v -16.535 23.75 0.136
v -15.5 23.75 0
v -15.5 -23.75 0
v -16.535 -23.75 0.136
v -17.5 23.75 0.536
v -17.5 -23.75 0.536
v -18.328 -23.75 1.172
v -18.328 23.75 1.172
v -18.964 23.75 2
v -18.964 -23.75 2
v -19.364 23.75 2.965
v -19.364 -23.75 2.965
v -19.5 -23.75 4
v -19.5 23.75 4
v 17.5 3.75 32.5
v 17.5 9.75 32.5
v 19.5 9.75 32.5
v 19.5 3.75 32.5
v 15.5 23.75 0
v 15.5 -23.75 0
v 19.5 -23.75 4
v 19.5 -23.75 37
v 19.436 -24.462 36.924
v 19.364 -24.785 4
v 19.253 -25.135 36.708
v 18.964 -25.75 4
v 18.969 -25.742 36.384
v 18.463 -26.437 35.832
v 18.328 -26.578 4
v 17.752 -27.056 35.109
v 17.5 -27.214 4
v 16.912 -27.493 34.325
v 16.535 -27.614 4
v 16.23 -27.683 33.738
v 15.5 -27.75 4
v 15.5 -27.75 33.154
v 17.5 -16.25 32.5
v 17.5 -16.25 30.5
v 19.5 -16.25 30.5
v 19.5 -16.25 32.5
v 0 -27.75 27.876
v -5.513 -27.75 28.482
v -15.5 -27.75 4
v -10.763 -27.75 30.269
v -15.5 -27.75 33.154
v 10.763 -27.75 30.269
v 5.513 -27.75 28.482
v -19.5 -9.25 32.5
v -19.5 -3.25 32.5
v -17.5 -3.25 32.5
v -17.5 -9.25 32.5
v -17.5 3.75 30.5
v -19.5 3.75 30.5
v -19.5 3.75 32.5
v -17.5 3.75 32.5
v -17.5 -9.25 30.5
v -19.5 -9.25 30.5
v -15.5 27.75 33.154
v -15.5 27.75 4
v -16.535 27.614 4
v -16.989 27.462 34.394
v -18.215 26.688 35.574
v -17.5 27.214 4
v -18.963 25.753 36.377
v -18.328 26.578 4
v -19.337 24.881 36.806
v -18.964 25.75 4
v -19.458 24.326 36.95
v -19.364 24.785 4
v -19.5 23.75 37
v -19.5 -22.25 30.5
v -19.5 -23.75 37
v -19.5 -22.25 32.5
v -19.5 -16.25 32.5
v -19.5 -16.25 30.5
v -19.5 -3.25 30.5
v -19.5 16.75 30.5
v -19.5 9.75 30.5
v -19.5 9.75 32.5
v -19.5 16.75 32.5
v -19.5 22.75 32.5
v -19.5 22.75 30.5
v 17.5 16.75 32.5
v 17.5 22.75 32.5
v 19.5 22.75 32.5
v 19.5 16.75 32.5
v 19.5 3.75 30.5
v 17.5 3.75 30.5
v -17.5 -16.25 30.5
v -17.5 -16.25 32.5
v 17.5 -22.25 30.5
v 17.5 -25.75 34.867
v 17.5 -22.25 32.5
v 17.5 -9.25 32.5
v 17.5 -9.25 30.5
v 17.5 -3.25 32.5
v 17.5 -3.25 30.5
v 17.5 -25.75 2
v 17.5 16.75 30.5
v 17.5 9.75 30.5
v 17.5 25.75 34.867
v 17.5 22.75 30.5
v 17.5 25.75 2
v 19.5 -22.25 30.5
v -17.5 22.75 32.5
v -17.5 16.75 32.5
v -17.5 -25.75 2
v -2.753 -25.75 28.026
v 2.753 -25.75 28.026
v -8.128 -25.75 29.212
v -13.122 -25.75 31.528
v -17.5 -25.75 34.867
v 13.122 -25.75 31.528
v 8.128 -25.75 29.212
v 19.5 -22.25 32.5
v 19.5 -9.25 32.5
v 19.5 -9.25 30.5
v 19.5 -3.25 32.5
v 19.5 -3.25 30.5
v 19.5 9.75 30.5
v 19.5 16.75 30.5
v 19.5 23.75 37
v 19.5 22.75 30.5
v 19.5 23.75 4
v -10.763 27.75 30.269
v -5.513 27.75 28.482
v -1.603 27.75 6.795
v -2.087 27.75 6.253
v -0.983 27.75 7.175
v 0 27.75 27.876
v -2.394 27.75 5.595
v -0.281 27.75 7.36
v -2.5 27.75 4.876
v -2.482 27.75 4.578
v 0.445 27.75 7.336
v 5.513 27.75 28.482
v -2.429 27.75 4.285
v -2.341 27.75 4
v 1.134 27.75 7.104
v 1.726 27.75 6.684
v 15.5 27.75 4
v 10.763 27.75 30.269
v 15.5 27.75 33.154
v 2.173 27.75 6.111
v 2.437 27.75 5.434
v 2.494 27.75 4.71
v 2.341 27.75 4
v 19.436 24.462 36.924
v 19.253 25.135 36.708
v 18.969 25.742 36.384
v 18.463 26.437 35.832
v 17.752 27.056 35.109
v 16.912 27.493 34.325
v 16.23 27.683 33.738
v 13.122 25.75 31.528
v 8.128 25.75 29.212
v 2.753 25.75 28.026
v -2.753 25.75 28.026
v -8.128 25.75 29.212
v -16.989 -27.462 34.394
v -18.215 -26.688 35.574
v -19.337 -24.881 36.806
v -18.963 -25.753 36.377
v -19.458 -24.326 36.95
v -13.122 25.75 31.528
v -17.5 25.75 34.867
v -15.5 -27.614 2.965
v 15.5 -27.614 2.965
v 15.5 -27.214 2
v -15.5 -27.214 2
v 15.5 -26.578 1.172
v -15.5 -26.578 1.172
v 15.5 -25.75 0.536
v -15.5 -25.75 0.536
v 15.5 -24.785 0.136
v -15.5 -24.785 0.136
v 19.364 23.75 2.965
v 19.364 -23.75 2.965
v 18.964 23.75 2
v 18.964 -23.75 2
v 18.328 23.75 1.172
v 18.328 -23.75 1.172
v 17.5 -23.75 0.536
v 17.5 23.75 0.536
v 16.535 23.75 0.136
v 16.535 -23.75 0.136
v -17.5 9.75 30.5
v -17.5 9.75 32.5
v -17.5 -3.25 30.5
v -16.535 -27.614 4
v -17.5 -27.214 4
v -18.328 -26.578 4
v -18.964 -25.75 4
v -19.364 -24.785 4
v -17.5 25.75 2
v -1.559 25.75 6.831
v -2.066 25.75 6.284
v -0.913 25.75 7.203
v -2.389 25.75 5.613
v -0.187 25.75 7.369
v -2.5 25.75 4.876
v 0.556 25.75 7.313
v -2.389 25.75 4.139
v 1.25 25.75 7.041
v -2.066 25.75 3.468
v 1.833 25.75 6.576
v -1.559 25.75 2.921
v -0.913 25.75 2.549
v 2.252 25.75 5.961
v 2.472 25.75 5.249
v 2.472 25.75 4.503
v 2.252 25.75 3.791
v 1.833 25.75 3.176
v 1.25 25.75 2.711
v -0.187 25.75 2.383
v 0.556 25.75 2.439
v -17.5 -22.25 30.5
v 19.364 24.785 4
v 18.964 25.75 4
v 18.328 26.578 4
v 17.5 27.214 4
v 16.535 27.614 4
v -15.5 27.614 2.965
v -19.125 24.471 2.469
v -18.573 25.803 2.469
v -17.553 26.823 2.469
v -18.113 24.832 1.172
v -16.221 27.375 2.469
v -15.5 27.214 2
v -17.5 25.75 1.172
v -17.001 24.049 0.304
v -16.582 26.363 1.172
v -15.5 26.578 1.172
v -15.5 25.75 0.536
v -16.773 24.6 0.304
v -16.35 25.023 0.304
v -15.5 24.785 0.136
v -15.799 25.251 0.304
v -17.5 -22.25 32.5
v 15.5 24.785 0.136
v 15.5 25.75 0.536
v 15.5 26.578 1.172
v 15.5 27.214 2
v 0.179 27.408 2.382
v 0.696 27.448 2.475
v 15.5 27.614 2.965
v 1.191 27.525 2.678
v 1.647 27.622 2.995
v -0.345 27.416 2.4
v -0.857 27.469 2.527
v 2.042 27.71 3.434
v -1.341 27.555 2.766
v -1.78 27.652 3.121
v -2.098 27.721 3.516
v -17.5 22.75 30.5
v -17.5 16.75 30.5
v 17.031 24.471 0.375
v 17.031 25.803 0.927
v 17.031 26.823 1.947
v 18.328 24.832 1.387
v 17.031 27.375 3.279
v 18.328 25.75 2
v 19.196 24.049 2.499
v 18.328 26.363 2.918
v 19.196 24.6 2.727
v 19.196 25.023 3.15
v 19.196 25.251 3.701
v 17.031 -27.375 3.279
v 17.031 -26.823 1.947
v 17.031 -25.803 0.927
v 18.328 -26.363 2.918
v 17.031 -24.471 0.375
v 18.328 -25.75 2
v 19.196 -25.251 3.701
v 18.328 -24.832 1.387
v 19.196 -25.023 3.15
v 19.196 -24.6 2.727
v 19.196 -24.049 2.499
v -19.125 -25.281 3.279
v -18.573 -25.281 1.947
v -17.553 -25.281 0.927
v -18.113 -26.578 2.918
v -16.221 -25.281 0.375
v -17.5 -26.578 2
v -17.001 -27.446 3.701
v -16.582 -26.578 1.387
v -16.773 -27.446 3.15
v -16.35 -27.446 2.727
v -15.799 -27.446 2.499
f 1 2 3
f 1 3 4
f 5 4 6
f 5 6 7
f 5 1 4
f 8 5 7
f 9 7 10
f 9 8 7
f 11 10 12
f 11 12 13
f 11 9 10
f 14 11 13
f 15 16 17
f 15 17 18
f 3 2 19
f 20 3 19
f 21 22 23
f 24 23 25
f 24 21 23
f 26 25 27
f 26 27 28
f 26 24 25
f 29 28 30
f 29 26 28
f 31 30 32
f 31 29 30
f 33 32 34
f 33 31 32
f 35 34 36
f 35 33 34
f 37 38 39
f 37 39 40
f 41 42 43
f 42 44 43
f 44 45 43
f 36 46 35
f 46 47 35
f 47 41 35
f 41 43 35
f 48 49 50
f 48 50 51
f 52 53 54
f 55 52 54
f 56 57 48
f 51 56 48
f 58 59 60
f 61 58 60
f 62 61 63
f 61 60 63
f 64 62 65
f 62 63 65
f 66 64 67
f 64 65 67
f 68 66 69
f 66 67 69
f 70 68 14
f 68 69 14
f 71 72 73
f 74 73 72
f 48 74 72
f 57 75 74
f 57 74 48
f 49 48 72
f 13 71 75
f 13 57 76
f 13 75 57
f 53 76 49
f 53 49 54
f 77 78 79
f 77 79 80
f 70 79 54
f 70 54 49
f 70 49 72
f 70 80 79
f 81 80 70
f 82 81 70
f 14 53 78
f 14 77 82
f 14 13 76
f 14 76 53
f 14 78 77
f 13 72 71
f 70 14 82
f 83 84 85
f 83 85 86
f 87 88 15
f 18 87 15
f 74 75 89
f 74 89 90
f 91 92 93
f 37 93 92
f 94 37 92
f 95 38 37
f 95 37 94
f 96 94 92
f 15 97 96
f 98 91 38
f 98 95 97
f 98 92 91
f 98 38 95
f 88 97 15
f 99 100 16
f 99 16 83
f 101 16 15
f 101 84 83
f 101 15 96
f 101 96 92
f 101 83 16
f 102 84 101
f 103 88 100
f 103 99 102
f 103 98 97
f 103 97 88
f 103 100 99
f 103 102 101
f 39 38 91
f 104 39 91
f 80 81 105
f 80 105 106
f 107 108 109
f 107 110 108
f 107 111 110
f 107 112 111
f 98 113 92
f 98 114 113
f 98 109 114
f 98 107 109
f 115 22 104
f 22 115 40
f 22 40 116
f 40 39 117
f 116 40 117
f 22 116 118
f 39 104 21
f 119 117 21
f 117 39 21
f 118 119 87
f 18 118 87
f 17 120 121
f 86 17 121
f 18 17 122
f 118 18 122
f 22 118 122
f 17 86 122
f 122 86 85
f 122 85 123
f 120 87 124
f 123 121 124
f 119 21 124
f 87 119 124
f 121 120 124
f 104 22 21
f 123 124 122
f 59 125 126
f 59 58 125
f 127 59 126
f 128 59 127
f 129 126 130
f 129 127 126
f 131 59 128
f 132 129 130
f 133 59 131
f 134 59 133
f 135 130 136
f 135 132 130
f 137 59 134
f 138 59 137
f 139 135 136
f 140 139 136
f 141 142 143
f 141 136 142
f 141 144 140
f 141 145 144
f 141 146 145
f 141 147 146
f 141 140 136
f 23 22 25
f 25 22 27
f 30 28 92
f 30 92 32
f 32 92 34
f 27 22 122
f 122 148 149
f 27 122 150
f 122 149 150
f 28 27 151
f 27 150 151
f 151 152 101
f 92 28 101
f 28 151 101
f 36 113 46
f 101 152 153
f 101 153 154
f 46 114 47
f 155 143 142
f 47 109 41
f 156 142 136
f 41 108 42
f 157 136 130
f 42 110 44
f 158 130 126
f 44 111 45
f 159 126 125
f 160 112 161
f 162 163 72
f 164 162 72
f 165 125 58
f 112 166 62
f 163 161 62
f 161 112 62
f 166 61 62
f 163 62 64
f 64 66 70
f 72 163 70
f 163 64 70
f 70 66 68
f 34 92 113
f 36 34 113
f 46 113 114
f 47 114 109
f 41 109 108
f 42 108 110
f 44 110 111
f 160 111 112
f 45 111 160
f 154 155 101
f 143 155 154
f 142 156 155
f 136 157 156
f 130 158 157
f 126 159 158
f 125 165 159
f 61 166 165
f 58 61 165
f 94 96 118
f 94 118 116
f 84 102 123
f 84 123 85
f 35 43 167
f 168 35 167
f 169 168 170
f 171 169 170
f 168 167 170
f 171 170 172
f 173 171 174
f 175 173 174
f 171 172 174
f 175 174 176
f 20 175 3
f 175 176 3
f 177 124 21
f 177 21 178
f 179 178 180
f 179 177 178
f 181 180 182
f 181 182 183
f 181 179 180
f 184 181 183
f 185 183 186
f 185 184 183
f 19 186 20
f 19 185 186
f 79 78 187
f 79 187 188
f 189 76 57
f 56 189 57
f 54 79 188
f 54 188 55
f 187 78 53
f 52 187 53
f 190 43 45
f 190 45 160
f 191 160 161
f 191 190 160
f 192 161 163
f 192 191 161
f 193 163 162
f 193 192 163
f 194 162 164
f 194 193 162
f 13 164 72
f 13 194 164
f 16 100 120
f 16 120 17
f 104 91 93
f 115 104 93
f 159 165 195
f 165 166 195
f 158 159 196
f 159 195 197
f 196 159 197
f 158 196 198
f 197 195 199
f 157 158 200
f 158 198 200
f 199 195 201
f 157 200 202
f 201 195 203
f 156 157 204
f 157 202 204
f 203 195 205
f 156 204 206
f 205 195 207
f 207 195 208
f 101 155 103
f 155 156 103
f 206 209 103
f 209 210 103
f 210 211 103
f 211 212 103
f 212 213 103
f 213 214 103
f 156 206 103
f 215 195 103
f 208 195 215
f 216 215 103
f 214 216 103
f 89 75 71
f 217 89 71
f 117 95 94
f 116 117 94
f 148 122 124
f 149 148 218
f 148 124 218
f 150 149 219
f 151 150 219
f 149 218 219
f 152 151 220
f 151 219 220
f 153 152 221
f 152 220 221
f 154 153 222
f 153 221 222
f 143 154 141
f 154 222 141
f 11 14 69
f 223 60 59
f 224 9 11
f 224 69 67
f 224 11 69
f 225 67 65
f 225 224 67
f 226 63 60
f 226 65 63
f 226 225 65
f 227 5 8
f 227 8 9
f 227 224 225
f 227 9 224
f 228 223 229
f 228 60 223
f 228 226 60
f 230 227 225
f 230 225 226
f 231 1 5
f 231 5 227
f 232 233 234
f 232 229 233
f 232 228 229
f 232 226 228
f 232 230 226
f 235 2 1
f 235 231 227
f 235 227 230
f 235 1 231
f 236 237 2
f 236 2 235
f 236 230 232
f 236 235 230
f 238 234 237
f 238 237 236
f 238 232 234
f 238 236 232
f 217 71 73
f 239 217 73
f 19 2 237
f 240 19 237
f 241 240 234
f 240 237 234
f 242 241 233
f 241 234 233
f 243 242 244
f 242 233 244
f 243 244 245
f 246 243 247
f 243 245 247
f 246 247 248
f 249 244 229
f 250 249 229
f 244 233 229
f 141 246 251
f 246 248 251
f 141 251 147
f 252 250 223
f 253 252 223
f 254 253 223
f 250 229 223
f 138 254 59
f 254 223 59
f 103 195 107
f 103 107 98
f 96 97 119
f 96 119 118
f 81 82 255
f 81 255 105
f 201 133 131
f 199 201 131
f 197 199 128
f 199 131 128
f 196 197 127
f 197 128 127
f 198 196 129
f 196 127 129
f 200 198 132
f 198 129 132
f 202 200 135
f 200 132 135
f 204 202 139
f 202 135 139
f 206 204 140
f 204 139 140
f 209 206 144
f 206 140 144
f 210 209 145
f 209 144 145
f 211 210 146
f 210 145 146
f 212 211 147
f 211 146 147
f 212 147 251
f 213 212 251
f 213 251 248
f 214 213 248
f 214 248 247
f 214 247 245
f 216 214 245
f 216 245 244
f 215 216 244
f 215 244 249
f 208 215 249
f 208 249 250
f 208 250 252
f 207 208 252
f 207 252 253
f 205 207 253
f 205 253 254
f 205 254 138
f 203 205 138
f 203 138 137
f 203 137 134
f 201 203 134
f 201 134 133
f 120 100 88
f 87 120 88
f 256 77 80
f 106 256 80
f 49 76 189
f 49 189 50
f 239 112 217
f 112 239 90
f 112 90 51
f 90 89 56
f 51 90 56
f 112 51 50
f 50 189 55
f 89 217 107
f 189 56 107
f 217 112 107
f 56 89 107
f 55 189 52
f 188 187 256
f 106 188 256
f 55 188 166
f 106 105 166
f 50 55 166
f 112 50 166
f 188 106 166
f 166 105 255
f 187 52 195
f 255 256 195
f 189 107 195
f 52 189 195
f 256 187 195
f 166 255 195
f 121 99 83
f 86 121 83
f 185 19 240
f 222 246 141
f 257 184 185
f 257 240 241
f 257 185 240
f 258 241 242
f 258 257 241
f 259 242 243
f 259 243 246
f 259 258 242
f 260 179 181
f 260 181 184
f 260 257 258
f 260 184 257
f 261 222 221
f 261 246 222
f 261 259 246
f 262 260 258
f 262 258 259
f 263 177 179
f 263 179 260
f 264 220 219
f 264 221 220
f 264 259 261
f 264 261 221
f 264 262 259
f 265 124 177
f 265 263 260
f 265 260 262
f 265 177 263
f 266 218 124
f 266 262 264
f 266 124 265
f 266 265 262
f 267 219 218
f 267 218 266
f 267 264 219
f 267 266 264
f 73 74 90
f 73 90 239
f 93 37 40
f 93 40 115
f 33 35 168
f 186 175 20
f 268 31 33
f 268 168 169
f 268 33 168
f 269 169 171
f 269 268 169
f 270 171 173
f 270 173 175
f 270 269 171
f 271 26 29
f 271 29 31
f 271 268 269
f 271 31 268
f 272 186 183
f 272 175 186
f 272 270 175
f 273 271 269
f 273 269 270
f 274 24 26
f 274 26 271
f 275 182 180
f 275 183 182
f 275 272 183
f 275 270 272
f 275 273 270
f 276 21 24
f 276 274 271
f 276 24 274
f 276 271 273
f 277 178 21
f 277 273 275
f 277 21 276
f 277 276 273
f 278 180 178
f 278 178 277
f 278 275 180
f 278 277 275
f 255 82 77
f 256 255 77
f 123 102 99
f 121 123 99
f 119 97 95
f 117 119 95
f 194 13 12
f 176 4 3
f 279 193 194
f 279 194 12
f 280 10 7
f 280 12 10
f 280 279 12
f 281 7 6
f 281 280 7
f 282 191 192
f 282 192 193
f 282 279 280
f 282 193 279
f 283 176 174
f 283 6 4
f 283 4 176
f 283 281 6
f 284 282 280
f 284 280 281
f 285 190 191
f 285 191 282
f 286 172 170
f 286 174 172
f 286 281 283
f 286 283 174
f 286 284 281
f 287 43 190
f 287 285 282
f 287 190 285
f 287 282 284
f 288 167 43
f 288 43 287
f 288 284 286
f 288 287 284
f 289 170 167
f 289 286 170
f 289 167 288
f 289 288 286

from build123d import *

# Parameters (mm, degrees)
F0_W         = 39
F0_H         = 55.5
F0_W_2       = 35
F0_H_2       = 51.5
F1_DEPTH     = 37
F3_DEPTH     = 56
F4_DEPTH     = 2
F5_R         = 2.5
F6_DEPTH     = 3
F7_W         = 6
F7_H         = 2
F8_DEPTH     = 40
F9_T1_DEPTH  = 47.5
F9_T3_DEPTH  = 31
F9_T5_DEPTH  = 43
F9_S9_W      = 4
F9_S9_H      = 4
F9_T10_DEPTH = 4
F9_S15_W     = 4
F9_S15_H     = 4
F9_T16_DEPTH = 4
F9_S21_W     = 4
F9_S21_H     = 4
F9_T22_DEPTH = 4
F9_S27_W     = 4
F9_S27_H     = 4
F9_T28_DEPTH = 4


# Not quite as in the source:
# - a fillet or chamfer that OpenCascade refuses, or shapes differently, is made with other operations: its cross-section is extruded or revolved along the edge and cut away or added


with BuildPart() as f1:
    # F0 (on Top) → F1 (new body)
    with BuildSketch(Plane.XY):
        Rectangle(F0_W, F0_H)
        Rectangle(F0_W_2, F0_H_2, mode=Mode.SUBTRACT)
    extrude(amount=F1_DEPTH)

    # F2 (on face) → F3 (cut)
    with BuildSketch(Plane(origin=(0, 27.75, 0), x_dir=(-1, 0, 0), z_dir=(0, 1, 0))):
        with BuildLine():
            Line((19.5, 37), (-19.5, 37))
            ThreePointArc((-19.5, 37), (0, 27.8760560333), (19.5, 37))
        make_face()
    extrude(amount=-F3_DEPTH, mode=Mode.SUBTRACT)

    # F0 (on Top) → F4 (join)
    with BuildSketch(Plane.XY):
        Rectangle(F0_W_2, F0_H_2)
    extrude(amount=F4_DEPTH)

    # F5 (on face) → F6 (cut)
    with BuildSketch(Plane(origin=(0, 27.75, 0), x_dir=(-1, 0, 0), z_dir=(0, 1, 0))):
        with Locations((0, 4.8760560333)):
            Circle(F5_R)
    extrude(amount=-F6_DEPTH, mode=Mode.SUBTRACT)

    # F7 (on face) → F8 (cut)
    with BuildSketch(Plane(origin=(-19.5, 0, 0), x_dir=(0, -1, 0), z_dir=(-1, 0, 0))):
        with Locations((-19.75, 31.5)):
            Rectangle(F7_W, F7_H)
        with Locations((-6.75, 31.5)):
            Rectangle(F7_W, F7_H)
        with Locations((6.25, 31.5)):
            Rectangle(F7_W, F7_H)
        with Locations((19.25, 31.5)):
            Rectangle(F7_W, F7_H)
    extrude(amount=-F8_DEPTH, mode=Mode.SUBTRACT)

    # F9: fillet of radius 4 on 8 edges, made by hand

    # F9_s2 → F9_t1 (cut)
    with BuildSketch(Plane.XZ.offset(-23.75)):
        with BuildLine():
            ThreePointArc((-15.5, 0), (-18.3284271247, 1.1715728753), (-19.5, 4))
            Line((-19.5, 4), (-19.5, 0))
            Line((-19.5, 0), (-15.5, 0))
        make_face()
        with BuildLine():
            ThreePointArc((19.5, 4), (18.3284271247, 1.1715728753), (15.5, 0))
            Line((15.5, 0), (19.5, 0))
            Line((19.5, 0), (19.5, 4))
        make_face()
    extrude(amount=F9_T1_DEPTH, mode=Mode.SUBTRACT)

    # F9_s4 → F9_t3 (cut)
    with BuildSketch(Plane.YZ.offset(-15.5)):
        with BuildLine():
            ThreePointArc((23.75, 0), (26.5784271247, 1.1715728753), (27.75, 4))
            Line((27.75, 4), (27.75, 0))
            Line((27.75, 0), (23.75, 0))
        make_face()
        with BuildLine():
            ThreePointArc((-27.75, 4), (-26.5784271247, 1.1715728753), (-23.75, 0))
            Line((-23.75, 0), (-27.75, 0))
            Line((-27.75, 0), (-27.75, 4))
        make_face()
    extrude(amount=F9_T3_DEPTH, mode=Mode.SUBTRACT)

    # F9_s6 → F9_t5 (cut)
    with BuildSketch(Plane.XY.offset(4)):
        with BuildLine():
            ThreePointArc((-15.5, -27.75), (-18.3284271247, -26.5784271247), (-19.5, -23.75))
            Line((-19.5, -23.75), (-19.5, -27.75))
            Line((-19.5, -27.75), (-15.5, -27.75))
        make_face()
        with BuildLine():
            ThreePointArc((19.5, -23.75), (18.3284271247, -26.5784271247), (15.5, -27.75))
            Line((15.5, -27.75), (19.5, -27.75))
            Line((19.5, -27.75), (19.5, -23.75))
        make_face()
        with BuildLine():
            ThreePointArc((19.5, 23.75), (18.3284271247, 26.5784271247), (15.5, 27.75))
            Line((15.5, 27.75), (19.5, 27.75))
            Line((19.5, 27.75), (19.5, 23.75))
        make_face()
        with BuildLine():
            ThreePointArc((-15.5, 27.75), (-18.3284271247, 26.5784271247), (-19.5, 23.75))
            Line((-19.5, 23.75), (-19.5, 27.75))
            Line((-19.5, 27.75), (-15.5, 27.75))
        make_face()
    extrude(amount=F9_T5_DEPTH, mode=Mode.SUBTRACT)


with BuildPart() as f9_tool8:
    # F9_s9 → F9_t10 (new body)
    with BuildSketch(Plane.XY.offset(4)):
        with Locations((-17.5, 25.75)):
            Rectangle(F9_S9_W, F9_S9_H)
    extrude(amount=-F9_T10_DEPTH)

    # F9_s11 → F9_t12 (revolve, cut)
    with BuildSketch(Plane(origin=(-15.5, 23.75, 4), x_dir=(0.7071067812, -0.7071067812, 0), z_dir=(0.7071067812, 0.7071067812, 0))):
        with BuildLine():
            ThreePointArc((0, -4), (4, 0), (0, 4))
            Line((0, 4), (0, -4))
        make_face()
    revolve(axis=Axis((-15.5, 23.75, 4), (0, 0, -1)), mode=Mode.SUBTRACT)


with BuildPart() as f1_1:
    add(f1.part)

    # F9_t7: cut F9_tool8
    add(f9_tool8.part, mode=Mode.SUBTRACT)


with BuildPart() as f9_tool14:
    # F9_s15 → F9_t16 (new body)
    with BuildSketch(Plane.XZ.offset(23.75)):
        with Locations((-17.5, 2)):
            Rectangle(F9_S15_W, F9_S15_H)
    extrude(amount=F9_T16_DEPTH)

    # F9_s17 → F9_t18 (revolve, cut)
    with BuildSketch(Plane(origin=(-15.5, -23.75, 4), x_dir=(0.7071067812, 0, 0.7071067812), z_dir=(0.7071067812, 0, -0.7071067812))):
        with BuildLine():
            ThreePointArc((0, -4), (4, 0), (0, 4))
            Line((0, 4), (0, -4))
        make_face()
    revolve(axis=Axis((-15.5, -23.75, 4), (0, -1, 0)), mode=Mode.SUBTRACT)


with BuildPart() as f1_2:
    add(f1_1.part)

    # F9_t13: cut F9_tool14
    add(f9_tool14.part, mode=Mode.SUBTRACT)


with BuildPart() as f9_tool20:
    # F9_s21 → F9_t22 (new body)
    with BuildSketch(Plane.YZ.offset(15.5)):
        with Locations((25.75, 2)):
            Rectangle(F9_S21_W, F9_S21_H)
    extrude(amount=F9_T22_DEPTH)

    # F9_s23 → F9_t24 (revolve, cut)
    with BuildSketch(Plane(origin=(15.5, 23.75, 4), x_dir=(0, -0.7071067812, 0.7071067812), z_dir=(0, 0.7071067812, 0.7071067812))):
        with BuildLine():
            ThreePointArc((0, -4), (4, 0), (0, 4))
            Line((0, 4), (0, -4))
        make_face()
    revolve(axis=Axis((15.5, 23.75, 4), (1, 0, 0)), mode=Mode.SUBTRACT)


with BuildPart() as f1_3:
    add(f1_2.part)

    # F9_t19: cut F9_tool20
    add(f9_tool20.part, mode=Mode.SUBTRACT)


with BuildPart() as f9_tool26:
    # F9_s27 → F9_t28 (new body)
    with BuildSketch(Plane.YZ.offset(15.5)):
        with Locations((-25.75, 2)):
            Rectangle(F9_S27_W, F9_S27_H)
    extrude(amount=F9_T28_DEPTH)

    # F9_s29 → F9_t30 (revolve, cut)
    with BuildSketch(Plane(origin=(15.5, -23.75, 4), x_dir=(0, 0.7071067812, 0.7071067812), z_dir=(0, 0.7071067812, -0.7071067812))):
        with BuildLine():
            ThreePointArc((0, -4), (4, 0), (0, 4))
            Line((0, 4), (0, -4))
        make_face()
    revolve(axis=Axis((15.5, -23.75, 4), (1, 0, 0)), mode=Mode.SUBTRACT)


with BuildPart() as f1_4:
    add(f1_3.part)

    # F9_t25: cut F9_tool26
    add(f9_tool26.part, mode=Mode.SUBTRACT)


solid = f1_4.part
